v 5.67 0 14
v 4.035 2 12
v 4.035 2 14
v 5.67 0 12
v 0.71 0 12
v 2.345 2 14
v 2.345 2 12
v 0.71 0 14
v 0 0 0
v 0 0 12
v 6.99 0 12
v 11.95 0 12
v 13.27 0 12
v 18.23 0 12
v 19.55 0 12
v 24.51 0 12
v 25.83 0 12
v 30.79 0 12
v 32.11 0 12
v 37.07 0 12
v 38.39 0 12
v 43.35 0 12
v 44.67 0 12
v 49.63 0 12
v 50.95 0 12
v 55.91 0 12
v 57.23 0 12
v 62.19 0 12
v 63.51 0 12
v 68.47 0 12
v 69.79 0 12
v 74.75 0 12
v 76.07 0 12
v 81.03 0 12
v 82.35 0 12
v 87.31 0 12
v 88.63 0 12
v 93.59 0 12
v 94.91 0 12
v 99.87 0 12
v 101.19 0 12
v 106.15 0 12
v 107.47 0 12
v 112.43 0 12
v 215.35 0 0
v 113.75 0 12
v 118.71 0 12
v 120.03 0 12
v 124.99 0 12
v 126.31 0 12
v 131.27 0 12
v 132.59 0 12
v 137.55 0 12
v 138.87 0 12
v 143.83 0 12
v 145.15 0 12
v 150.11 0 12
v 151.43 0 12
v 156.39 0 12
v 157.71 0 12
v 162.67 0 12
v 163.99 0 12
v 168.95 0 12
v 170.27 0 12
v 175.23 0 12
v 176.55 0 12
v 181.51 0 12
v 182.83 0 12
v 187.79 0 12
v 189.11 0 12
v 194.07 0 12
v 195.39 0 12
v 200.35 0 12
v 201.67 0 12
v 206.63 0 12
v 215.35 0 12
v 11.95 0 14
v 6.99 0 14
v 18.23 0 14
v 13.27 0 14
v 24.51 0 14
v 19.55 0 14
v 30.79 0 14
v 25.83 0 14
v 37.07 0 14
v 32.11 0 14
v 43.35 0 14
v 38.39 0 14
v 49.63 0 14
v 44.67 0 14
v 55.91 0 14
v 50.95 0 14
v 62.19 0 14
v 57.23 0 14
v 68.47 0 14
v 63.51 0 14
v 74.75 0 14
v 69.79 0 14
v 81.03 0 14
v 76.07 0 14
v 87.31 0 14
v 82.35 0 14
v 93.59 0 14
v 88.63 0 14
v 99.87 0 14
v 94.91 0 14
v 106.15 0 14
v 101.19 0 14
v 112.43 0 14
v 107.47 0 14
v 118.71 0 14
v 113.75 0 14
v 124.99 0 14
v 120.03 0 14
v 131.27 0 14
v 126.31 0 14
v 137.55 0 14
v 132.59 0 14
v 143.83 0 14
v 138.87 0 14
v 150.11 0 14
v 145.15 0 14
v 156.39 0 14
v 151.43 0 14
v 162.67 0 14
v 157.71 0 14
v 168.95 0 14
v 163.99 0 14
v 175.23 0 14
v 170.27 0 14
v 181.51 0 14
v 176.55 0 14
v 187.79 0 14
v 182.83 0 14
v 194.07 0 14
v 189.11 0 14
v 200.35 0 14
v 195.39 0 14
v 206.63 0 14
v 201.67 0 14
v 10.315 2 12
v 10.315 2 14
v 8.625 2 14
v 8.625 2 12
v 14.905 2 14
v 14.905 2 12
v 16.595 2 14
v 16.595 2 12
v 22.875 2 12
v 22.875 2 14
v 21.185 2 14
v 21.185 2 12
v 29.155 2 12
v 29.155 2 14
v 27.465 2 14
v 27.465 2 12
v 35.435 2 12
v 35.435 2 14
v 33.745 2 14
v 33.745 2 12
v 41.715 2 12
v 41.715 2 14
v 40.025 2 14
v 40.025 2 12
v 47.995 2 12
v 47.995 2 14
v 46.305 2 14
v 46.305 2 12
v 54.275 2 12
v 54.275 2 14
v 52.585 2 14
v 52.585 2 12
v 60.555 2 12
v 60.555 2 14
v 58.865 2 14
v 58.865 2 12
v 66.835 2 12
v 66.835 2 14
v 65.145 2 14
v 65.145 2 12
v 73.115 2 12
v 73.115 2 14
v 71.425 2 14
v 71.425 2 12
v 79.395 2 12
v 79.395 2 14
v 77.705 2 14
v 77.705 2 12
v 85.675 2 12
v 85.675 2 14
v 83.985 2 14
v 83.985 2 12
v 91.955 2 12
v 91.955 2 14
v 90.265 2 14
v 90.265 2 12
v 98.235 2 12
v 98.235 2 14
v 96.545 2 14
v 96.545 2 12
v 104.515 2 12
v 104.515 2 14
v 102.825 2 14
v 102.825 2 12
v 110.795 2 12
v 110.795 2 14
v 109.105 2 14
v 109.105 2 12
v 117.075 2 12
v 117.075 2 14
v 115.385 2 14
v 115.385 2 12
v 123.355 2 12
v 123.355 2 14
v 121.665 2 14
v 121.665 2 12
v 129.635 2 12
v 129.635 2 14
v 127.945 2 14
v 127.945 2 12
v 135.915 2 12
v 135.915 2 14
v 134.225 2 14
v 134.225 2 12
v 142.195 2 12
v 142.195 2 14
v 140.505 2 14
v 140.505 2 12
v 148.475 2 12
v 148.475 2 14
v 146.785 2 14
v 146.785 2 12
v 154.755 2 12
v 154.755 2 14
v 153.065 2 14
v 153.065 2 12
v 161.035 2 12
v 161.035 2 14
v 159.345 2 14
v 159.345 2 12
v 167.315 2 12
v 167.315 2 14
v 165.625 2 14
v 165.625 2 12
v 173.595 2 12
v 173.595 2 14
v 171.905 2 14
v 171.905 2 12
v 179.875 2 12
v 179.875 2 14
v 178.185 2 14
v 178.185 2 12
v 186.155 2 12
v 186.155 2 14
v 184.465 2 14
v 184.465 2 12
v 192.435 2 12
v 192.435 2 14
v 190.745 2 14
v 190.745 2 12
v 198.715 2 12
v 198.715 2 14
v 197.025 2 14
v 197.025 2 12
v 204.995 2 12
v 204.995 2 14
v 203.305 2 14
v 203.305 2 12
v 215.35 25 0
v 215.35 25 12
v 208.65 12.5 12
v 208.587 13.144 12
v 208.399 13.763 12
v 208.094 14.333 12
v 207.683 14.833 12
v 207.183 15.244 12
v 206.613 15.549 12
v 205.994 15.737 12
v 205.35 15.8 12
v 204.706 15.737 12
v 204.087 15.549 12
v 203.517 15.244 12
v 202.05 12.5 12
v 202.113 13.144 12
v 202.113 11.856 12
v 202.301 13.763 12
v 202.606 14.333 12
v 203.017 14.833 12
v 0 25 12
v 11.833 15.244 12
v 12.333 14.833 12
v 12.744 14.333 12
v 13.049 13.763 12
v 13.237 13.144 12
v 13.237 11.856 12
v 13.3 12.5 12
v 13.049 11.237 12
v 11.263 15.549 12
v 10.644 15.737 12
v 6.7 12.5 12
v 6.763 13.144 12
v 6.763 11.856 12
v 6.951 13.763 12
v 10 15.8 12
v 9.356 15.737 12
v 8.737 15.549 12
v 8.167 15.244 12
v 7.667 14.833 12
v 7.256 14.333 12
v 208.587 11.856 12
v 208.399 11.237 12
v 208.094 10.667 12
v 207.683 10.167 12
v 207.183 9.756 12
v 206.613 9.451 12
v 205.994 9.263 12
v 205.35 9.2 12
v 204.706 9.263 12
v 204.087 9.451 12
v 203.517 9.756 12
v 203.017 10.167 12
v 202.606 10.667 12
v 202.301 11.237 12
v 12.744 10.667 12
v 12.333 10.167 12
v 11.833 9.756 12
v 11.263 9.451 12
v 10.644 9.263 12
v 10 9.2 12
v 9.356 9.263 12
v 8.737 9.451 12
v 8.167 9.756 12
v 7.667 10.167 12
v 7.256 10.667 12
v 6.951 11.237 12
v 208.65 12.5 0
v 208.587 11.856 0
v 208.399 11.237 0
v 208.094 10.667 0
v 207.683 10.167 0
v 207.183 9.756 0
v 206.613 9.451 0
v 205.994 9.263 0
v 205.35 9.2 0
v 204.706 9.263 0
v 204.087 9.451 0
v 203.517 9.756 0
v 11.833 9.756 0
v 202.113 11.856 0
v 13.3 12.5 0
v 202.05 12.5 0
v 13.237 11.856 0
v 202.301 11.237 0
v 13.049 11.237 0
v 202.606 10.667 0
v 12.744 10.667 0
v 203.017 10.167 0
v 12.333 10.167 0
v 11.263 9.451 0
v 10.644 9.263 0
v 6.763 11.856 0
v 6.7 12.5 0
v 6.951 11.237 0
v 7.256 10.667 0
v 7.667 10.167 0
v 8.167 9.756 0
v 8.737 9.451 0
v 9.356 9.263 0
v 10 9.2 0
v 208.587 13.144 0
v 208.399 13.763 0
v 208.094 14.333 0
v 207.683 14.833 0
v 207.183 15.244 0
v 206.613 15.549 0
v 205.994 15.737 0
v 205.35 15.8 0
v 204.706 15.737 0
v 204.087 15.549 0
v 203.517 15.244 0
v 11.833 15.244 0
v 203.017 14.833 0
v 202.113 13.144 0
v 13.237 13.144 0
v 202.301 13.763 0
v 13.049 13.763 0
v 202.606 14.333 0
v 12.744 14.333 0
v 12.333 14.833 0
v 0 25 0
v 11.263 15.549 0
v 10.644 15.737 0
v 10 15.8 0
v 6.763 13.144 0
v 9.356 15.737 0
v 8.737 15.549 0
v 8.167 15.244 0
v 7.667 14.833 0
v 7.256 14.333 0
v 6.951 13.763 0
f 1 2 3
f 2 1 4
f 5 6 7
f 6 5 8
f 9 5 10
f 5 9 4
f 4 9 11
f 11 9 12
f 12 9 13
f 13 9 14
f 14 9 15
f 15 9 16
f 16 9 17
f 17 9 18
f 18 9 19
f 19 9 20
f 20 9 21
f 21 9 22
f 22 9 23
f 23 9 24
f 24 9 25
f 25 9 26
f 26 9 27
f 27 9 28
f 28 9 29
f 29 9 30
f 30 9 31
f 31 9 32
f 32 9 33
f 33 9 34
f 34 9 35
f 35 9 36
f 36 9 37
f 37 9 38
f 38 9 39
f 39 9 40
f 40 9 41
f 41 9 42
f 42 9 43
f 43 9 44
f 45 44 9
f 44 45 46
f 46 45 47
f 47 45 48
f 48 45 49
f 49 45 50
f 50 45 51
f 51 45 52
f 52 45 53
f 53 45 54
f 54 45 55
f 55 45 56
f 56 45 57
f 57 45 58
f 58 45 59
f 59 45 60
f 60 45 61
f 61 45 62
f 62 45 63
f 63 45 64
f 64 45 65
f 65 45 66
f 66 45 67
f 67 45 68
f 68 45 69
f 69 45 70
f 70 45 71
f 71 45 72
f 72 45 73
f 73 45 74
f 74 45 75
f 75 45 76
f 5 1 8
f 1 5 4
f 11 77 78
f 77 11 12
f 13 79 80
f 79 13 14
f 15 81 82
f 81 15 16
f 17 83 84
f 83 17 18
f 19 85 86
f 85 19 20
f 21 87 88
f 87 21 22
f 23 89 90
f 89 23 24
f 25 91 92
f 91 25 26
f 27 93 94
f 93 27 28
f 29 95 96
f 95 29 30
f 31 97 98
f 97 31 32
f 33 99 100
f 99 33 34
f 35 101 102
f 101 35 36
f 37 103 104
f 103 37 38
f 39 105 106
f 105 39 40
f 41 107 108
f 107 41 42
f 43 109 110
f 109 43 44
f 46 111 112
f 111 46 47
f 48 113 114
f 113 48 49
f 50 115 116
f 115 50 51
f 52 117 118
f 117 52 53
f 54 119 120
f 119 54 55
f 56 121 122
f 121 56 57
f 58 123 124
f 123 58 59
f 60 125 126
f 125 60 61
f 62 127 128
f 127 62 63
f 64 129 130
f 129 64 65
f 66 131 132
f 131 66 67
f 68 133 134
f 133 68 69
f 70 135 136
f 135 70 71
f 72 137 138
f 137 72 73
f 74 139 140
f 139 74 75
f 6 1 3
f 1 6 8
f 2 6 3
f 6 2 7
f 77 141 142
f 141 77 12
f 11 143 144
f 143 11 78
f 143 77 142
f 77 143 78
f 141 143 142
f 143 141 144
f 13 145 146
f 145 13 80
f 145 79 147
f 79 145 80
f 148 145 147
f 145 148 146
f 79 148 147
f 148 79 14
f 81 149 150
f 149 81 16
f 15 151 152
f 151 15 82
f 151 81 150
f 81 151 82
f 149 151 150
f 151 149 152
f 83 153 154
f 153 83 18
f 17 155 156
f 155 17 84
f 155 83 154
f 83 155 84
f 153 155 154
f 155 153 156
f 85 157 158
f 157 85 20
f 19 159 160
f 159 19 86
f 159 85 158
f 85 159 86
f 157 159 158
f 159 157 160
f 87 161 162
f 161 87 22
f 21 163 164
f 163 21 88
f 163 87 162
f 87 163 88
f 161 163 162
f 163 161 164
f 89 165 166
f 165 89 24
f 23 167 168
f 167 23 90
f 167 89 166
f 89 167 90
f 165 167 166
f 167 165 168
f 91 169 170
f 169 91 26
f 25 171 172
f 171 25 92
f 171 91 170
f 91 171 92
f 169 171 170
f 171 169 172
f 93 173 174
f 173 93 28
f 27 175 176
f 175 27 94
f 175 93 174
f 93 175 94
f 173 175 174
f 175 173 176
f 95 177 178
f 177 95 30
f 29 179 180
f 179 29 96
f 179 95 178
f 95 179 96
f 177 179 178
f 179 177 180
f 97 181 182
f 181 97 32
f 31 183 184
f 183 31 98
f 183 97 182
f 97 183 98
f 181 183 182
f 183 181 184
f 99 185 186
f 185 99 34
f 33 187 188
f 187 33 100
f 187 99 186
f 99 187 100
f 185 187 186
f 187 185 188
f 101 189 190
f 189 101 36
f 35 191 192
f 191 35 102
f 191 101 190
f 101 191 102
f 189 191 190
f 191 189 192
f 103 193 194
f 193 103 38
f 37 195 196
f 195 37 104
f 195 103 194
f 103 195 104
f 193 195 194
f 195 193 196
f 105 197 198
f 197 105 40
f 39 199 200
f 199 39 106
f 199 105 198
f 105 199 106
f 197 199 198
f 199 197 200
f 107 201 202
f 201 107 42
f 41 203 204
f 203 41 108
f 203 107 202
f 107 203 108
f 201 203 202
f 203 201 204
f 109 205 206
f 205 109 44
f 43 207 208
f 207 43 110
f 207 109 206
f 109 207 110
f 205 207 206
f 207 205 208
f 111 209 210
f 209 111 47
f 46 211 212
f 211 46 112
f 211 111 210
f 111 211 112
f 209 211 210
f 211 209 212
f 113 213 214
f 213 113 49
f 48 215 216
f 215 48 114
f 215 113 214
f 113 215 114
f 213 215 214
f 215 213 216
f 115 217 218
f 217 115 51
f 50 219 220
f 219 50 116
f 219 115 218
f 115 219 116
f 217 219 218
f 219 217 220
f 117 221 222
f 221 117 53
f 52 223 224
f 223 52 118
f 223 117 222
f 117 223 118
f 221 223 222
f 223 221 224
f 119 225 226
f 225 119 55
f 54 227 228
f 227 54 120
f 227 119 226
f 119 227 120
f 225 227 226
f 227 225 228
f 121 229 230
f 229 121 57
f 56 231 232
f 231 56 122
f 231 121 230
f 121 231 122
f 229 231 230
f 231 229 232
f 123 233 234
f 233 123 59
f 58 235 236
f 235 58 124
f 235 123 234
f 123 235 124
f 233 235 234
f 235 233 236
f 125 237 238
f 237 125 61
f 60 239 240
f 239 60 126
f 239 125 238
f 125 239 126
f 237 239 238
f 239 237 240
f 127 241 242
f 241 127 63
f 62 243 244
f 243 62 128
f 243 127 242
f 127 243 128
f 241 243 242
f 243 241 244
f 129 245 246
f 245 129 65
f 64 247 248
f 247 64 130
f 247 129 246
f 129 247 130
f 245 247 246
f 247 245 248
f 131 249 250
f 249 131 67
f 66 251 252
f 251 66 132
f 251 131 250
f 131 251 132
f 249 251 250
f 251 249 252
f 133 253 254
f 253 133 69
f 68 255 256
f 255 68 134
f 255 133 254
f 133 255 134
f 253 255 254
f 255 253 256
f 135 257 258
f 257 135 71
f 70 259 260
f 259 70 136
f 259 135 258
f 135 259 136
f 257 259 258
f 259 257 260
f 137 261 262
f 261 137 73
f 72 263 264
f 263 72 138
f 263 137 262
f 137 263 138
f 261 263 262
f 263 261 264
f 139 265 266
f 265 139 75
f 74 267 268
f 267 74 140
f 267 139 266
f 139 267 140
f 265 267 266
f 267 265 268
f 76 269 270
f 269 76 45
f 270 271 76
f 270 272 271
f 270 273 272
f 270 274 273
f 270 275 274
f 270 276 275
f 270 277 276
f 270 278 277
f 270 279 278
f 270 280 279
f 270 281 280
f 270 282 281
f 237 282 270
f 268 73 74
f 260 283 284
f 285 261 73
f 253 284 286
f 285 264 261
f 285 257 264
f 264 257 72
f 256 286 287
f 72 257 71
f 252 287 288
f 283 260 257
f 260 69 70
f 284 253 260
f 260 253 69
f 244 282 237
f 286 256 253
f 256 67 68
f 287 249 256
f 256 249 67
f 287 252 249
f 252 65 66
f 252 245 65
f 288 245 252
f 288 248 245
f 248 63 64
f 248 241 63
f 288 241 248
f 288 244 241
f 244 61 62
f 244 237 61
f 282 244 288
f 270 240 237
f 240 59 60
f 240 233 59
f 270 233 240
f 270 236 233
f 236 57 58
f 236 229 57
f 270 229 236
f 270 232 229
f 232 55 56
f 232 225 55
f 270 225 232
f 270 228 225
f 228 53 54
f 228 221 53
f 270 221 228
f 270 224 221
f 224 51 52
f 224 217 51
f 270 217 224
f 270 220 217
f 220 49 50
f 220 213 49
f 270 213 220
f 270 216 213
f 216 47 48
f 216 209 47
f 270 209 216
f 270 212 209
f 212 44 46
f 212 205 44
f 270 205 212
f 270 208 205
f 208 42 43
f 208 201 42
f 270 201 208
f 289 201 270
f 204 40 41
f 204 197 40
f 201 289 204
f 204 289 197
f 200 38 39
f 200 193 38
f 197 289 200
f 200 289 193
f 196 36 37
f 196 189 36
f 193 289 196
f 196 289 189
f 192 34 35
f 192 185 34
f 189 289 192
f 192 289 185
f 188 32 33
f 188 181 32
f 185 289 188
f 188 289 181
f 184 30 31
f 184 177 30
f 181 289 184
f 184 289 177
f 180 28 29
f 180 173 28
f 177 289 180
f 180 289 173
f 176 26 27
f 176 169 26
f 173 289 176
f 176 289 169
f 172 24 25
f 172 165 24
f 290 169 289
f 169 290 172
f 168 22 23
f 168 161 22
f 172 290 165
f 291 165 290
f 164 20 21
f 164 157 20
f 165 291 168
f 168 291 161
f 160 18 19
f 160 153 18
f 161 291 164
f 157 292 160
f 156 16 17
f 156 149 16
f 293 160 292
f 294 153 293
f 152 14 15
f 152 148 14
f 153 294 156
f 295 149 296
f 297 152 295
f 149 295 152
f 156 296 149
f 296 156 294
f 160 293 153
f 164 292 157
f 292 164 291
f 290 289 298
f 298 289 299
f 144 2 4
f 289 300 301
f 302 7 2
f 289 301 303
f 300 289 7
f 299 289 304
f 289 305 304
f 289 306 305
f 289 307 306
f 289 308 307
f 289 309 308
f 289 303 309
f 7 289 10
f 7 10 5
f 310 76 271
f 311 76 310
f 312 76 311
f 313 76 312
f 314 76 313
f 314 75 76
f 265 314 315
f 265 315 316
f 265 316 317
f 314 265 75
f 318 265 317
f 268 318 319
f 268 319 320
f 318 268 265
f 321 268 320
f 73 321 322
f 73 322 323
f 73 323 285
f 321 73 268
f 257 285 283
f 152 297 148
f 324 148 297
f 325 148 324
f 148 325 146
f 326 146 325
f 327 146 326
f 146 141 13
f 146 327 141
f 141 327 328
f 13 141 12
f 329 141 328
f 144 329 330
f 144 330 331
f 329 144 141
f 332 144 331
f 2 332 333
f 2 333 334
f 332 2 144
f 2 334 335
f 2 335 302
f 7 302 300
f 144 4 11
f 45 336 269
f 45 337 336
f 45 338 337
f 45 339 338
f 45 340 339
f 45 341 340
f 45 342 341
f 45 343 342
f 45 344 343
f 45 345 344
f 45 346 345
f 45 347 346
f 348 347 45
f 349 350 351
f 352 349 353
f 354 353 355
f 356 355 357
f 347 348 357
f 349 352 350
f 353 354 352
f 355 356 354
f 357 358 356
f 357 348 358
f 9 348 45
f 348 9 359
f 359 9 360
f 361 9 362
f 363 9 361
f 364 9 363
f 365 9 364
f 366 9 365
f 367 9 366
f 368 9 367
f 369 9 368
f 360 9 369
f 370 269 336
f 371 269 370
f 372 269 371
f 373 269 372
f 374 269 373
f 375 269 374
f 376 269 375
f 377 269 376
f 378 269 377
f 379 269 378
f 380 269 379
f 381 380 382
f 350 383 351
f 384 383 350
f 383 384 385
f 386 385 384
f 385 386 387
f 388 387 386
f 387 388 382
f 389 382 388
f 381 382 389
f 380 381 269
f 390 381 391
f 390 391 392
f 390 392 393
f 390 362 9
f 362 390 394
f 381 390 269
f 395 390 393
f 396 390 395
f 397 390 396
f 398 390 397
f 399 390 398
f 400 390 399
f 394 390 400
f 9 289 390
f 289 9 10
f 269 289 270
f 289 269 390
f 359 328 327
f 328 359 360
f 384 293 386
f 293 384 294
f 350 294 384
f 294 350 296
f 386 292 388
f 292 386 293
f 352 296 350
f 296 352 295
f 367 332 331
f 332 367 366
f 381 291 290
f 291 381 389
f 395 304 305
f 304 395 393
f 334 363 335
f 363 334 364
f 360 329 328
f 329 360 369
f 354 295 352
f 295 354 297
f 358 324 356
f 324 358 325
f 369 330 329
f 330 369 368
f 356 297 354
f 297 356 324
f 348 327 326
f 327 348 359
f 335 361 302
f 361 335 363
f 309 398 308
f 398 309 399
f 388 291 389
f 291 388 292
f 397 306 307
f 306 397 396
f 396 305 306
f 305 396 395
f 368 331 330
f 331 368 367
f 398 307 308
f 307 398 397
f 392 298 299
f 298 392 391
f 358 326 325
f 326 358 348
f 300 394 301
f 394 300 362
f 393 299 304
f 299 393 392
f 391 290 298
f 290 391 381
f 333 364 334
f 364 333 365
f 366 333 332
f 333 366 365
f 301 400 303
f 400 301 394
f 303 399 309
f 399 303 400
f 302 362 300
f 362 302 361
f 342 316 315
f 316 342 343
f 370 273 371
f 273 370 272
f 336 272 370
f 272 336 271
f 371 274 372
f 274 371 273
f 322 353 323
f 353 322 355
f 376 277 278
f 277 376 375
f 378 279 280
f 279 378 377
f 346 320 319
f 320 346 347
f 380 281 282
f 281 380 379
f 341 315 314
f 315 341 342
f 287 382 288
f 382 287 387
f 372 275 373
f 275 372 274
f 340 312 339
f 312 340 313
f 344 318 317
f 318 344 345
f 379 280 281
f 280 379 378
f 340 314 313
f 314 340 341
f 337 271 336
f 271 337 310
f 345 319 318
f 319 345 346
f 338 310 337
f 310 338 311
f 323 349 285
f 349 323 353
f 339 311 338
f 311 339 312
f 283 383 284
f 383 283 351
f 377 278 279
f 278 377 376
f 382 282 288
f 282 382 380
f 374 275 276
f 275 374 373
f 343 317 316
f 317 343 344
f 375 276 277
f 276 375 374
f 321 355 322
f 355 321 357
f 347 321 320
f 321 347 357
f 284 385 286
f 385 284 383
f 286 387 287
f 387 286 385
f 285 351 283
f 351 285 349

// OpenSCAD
$fn = 32;

// ----------------------------------------------------------------------
// Gear rack: m=2 z=33, 215.35 x 25 x 14 mm
// ----------------------------------------------------------------------

// --- parameters (mm) ---
length = 215.35;          // rack length, X
width = 25;               // rack width, Y
height = 14;              // overall height, Z
module_m = 2;             // module
back_t = 12;              // tooth root line height
pitch = 6.28;             // circular pitch
tip_w = 1.69;             // tooth thickness at the tip
root_w = 4.96;            // tooth thickness at the root line
hole_d = 6.6;             // mounting hole
sink = 0.6;               // tooth root overlap into the body

tooth_span = 207.34;

module tooth(x0) {
  /* 20 deg flank profile, sunk into the body for a positive overlap */
  translate([x0, 0, back_t - sink])
    linear_extrude(height = height - back_t + sink)
      polygon(points = [[-root_w / 2, 0], [root_w / 2, 0],
                        [tip_w / 2, height - back_t],
                        [-tip_w / 2, height - back_t]]);
}

difference() {
  union() {
    cube([length, width, back_t]);
    for (i = [0 : 33 - 1])
      tooth((i + 0.5) * pitch + (tooth_span - 33 * pitch) / 2);
  }
  translate([10, 12.5, -1]) cylinder(h = back_t + 2, d = hole_d);
  translate([205.35, 12.5, -1]) cylinder(h = back_t + 2, d = hole_d);
}
